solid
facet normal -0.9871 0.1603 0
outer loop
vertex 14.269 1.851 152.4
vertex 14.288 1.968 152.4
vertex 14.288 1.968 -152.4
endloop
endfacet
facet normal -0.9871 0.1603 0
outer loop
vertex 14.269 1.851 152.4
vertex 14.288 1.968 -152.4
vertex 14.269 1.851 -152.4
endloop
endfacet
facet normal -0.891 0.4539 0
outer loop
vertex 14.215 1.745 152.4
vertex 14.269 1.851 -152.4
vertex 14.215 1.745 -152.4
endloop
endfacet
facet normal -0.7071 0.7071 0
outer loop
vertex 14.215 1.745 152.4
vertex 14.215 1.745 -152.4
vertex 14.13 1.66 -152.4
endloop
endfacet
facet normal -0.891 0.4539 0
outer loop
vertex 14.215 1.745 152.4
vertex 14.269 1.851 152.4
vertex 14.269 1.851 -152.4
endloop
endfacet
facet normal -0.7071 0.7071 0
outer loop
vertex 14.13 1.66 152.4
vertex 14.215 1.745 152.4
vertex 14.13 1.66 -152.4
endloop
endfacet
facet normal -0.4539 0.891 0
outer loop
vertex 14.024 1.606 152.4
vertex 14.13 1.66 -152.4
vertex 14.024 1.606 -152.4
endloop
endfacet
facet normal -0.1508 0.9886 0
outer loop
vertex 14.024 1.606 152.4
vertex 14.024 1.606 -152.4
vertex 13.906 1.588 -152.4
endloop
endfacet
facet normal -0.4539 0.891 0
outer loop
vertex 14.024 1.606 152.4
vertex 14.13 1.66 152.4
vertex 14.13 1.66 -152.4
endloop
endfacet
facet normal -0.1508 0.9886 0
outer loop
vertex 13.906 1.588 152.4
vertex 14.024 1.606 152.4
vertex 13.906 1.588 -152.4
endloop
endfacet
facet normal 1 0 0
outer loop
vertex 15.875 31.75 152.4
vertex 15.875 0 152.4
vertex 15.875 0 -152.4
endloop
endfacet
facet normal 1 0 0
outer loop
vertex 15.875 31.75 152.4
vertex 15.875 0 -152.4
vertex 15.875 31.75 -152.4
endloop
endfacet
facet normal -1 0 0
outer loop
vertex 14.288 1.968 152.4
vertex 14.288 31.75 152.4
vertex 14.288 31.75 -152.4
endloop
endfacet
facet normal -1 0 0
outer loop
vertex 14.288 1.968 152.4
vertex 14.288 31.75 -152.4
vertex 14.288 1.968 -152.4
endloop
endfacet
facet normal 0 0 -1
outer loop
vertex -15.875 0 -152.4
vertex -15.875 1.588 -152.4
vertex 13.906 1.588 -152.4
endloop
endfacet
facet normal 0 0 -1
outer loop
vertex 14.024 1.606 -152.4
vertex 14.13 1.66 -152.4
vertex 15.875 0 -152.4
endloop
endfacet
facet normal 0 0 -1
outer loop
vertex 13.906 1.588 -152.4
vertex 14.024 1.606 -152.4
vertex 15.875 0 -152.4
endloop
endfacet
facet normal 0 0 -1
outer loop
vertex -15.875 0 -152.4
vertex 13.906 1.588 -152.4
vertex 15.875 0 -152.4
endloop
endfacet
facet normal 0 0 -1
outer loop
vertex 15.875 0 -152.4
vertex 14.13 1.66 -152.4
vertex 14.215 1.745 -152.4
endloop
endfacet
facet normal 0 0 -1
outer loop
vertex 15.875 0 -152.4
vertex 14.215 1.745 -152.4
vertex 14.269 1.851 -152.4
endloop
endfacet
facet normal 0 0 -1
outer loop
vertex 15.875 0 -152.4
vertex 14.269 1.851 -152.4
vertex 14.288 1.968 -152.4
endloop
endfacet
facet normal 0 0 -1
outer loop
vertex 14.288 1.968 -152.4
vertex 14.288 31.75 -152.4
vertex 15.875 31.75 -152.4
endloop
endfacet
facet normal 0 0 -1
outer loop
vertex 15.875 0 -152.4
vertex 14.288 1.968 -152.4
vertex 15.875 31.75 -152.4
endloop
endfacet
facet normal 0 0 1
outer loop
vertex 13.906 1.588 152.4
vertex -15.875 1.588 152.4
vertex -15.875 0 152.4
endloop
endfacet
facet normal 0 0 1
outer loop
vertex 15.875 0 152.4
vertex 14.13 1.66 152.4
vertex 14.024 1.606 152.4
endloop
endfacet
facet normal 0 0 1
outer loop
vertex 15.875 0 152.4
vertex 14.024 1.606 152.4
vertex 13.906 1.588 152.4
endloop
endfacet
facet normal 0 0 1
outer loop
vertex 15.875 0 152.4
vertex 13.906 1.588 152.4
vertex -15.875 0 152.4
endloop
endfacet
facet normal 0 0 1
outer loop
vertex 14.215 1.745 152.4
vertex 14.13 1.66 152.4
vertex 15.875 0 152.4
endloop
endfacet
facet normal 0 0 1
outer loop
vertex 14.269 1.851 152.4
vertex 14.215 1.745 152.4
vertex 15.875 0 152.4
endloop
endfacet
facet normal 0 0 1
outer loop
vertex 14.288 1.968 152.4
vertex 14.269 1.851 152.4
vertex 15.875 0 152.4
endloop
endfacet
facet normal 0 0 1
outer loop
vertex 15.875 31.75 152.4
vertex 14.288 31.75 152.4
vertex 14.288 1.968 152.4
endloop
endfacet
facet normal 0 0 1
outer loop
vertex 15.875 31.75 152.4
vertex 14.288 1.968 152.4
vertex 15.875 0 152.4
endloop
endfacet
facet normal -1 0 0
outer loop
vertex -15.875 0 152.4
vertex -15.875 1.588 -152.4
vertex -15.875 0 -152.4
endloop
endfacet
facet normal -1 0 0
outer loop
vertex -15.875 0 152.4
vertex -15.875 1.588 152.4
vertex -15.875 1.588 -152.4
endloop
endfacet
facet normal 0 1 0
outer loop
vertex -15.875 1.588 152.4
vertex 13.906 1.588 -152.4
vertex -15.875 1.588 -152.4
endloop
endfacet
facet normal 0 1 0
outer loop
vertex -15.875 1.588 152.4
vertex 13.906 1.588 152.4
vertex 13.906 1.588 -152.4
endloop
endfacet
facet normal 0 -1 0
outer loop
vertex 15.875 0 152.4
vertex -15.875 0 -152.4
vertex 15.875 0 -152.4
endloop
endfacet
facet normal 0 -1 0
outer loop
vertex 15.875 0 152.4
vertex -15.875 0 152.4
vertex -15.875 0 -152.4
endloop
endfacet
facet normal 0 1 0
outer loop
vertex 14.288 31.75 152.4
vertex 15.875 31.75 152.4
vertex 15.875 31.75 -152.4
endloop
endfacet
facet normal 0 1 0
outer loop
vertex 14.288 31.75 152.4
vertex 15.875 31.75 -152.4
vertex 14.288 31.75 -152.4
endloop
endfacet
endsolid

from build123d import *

# Parameters (mm, degrees)
BOSS_EXTRUDE1_DEPTH = 152.4


with BuildPart() as part:
    # Sketch2 → Boss-Extrude1 (new, symmetric)
    with BuildSketch(Plane.XY):
        with BuildLine():
            Line((-15.875, 0), (15.875, 0))
            Line((15.875, 0), (15.875, 31.75))
            Line((15.875, 31.75), (14.2875, 31.75))
            Line((14.2875, 31.75), (14.2875, 1.9685))
            ThreePointArc((14.2875, 1.9685), (14.175907684, 1.699092316), (13.9065, 1.5875))
            Line((13.9065, 1.5875), (-15.875, 1.5875))
            Line((-15.875, 1.5875), (-15.875, 0))
        make_face()
    extrude(amount=BOSS_EXTRUDE1_DEPTH, both=True)


solid = part.part
